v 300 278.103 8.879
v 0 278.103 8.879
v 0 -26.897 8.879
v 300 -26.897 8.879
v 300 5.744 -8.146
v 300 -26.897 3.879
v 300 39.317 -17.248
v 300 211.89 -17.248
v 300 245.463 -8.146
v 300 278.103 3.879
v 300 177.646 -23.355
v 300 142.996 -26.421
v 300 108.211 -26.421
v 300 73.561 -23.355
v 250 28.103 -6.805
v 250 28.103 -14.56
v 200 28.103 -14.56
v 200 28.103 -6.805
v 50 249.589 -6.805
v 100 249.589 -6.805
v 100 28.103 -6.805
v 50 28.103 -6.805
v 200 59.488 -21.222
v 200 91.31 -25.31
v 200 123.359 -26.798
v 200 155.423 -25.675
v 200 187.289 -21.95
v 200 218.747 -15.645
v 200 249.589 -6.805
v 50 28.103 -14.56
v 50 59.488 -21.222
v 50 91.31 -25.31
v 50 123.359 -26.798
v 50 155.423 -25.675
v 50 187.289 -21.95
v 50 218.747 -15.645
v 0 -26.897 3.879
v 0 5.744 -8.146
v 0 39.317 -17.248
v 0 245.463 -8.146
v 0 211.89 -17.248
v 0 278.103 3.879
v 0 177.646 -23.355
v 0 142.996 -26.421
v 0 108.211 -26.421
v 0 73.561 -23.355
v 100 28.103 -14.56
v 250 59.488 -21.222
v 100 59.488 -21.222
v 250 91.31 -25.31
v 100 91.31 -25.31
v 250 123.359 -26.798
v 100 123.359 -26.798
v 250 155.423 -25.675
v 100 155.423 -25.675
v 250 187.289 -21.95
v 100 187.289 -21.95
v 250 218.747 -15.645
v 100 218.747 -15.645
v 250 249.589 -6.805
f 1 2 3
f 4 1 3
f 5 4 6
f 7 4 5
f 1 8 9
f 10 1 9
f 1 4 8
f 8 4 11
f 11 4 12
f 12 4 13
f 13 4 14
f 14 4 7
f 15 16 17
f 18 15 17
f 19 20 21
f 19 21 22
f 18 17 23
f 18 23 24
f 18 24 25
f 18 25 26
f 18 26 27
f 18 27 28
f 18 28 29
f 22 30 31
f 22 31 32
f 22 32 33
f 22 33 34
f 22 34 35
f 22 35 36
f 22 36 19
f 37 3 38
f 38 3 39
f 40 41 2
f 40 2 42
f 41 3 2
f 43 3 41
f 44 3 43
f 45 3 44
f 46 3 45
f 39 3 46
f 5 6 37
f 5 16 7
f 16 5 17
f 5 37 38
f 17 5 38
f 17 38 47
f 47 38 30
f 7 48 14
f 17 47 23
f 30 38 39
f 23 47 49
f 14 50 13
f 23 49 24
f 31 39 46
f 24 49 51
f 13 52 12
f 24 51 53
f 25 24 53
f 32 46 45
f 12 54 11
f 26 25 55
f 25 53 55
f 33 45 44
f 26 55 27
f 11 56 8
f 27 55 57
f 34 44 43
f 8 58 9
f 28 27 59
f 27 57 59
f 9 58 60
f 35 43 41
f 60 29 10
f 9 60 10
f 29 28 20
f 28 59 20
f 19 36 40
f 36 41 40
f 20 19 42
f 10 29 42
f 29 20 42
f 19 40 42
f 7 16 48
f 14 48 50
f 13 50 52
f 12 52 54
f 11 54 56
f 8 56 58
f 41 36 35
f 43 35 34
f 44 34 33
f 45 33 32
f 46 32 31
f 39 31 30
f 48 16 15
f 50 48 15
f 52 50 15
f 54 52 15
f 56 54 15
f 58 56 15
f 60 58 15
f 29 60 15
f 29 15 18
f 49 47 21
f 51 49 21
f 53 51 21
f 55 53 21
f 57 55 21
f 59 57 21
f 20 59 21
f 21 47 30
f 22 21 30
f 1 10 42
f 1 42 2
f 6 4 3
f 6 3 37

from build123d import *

# Parameters (mm, degrees)
BOSS_EXTRUDE1_DEPTH = 300
SKETCH3_W           = 50
SKETCH3_H           = 250
CUT_EXTRUDE1_DEPTH  = 20


with BuildPart() as part:
    # Sketch2 → Boss-Extrude1 (new body)
    with BuildSketch(Plane(origin=(0, 0, 0), x_dir=(0, 0, -1), z_dir=(1, 0, 0))):
        with BuildLine():
            Line((-8.879310345, 278.103448276), (-8.879310345, -26.896551724))
            Line((-8.879310345, -26.896551724), (-3.879310345, -26.896551724))
            ThreePointArc((-3.879310345, -26.896551724), (26.804536977, 125.603448276), (-3.879310345, 278.103448276))
            Line((-3.879310345, 278.103448276), (-8.879310345, 278.103448276))
        make_face()
    extrude(amount=BOSS_EXTRUDE1_DEPTH)

    # Sketch3 → Cut-Extrude1 (cut)
    with BuildSketch(Plane(origin=(0, 0, -26.804536977), x_dir=(-1, 0, 0), z_dir=(0, 0, -1))):
        with Locations((-225, 153.103448276)):
            Rectangle(SKETCH3_W, SKETCH3_H)
        with Locations((-75, 153.103448276)):
            Rectangle(SKETCH3_W, SKETCH3_H)
    extrude(amount=-CUT_EXTRUDE1_DEPTH, mode=Mode.SUBTRACT)


solid = part.part
